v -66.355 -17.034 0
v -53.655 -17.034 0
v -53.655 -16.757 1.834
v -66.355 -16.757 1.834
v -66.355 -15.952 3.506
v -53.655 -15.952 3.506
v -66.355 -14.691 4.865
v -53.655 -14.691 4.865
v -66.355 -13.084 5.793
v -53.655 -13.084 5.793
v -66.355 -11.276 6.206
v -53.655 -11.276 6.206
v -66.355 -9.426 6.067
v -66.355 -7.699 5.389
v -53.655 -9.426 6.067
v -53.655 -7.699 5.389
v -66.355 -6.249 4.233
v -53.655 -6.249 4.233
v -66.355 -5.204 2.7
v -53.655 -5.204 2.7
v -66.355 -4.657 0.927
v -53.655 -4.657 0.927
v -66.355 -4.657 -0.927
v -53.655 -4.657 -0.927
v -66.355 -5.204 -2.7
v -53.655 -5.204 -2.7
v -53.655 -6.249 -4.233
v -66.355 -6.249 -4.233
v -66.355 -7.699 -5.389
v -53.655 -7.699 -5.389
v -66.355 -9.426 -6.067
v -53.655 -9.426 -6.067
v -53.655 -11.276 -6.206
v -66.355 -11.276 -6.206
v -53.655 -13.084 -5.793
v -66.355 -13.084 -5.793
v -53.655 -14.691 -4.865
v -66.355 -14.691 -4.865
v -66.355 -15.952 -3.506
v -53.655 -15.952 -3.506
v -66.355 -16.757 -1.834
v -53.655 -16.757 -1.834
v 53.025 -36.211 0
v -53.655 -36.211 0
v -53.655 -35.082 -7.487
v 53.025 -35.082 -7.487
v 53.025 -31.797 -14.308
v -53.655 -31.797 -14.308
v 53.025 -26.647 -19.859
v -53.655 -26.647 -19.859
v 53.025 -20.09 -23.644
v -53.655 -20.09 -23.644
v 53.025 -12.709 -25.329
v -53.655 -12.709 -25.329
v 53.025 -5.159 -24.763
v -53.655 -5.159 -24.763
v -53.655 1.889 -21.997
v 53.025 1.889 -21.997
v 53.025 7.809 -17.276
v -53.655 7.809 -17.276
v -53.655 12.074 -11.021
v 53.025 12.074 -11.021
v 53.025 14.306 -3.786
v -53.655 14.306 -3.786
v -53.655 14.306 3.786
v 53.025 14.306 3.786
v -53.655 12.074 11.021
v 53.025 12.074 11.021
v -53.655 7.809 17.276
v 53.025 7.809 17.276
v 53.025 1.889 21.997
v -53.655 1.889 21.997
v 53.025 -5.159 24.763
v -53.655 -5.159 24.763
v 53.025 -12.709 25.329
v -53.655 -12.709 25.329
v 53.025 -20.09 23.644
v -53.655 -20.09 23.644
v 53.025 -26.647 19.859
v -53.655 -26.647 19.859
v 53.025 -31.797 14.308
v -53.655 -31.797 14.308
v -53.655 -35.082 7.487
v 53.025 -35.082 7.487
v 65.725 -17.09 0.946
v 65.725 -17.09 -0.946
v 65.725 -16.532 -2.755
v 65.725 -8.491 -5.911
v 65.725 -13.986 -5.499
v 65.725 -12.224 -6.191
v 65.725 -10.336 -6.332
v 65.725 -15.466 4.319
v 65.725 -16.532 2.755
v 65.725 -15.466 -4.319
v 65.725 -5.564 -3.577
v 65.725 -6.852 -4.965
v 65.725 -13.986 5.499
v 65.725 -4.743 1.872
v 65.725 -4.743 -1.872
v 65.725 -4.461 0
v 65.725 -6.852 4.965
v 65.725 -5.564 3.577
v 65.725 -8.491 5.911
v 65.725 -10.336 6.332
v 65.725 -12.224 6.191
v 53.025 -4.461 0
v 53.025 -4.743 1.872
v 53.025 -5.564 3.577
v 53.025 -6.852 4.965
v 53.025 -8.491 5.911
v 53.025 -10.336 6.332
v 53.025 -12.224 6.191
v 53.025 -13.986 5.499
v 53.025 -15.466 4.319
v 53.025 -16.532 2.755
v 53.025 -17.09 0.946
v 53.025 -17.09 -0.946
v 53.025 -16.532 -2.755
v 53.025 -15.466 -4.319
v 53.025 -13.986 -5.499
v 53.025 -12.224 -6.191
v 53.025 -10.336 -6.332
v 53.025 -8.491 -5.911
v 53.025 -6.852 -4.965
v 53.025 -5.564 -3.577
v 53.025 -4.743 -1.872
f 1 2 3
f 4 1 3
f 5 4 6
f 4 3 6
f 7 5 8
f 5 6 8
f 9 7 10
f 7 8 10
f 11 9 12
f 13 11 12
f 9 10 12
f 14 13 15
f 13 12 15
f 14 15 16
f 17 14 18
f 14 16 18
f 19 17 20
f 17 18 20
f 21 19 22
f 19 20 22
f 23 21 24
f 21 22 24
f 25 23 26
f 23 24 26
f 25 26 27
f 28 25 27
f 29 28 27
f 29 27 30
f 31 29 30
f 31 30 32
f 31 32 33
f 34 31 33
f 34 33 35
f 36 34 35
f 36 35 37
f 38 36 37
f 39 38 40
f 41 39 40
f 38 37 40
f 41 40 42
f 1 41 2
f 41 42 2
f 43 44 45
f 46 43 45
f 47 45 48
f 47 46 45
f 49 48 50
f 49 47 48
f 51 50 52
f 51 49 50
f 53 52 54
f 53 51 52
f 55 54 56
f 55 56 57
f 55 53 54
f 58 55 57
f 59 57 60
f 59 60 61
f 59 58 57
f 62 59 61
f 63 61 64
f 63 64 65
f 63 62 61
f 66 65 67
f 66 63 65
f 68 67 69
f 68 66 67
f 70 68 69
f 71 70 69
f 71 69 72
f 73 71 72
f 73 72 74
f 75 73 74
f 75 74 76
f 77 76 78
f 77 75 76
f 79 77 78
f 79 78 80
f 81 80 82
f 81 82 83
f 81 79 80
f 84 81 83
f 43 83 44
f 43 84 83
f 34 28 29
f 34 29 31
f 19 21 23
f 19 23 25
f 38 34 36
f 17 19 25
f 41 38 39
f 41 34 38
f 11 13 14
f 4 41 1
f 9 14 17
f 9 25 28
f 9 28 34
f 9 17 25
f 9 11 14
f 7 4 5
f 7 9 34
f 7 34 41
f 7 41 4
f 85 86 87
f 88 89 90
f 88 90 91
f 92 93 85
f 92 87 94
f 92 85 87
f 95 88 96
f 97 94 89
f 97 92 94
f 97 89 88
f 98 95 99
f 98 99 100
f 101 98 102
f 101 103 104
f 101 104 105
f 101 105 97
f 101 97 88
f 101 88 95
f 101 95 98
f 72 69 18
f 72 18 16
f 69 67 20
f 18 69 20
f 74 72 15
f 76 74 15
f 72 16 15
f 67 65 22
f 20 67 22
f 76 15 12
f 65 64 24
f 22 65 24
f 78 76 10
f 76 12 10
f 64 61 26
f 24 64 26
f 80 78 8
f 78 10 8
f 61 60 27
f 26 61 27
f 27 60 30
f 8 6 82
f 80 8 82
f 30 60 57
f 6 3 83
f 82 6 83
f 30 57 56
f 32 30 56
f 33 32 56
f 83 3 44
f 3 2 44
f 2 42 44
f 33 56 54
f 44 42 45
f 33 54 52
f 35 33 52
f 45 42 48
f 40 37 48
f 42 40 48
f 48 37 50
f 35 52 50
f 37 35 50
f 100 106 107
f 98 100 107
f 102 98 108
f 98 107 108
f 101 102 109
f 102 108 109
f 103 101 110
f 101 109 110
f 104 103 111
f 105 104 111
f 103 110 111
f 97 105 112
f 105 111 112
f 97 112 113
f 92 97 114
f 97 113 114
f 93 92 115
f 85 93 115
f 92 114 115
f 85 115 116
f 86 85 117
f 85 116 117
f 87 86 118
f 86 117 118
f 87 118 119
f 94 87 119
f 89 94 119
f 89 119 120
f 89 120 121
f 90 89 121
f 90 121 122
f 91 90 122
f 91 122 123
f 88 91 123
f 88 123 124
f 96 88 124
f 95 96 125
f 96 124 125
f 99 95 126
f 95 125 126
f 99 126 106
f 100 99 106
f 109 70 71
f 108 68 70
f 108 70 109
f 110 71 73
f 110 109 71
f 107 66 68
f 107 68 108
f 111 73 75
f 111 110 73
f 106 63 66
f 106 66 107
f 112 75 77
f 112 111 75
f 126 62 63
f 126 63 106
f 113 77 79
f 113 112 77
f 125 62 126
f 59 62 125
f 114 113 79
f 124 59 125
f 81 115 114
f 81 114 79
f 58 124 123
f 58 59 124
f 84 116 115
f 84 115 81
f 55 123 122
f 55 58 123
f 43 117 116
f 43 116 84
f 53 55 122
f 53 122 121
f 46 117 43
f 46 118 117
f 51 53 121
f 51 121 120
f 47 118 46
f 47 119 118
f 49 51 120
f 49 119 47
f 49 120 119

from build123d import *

# Parameters (mm, degrees)
F0_W     = 106.68
F0_H     = 25.4
F2_R     = 6.223
F3_DEPTH = 12.7
F4_R     = 6.35
F5_DEPTH = 12.7


with BuildPart() as f1:
    # F0 (on Top) → F1 (revolve)
    with BuildSketch(Plane.XY):
        with Locations((-0.314683, -23.51072)):
            Rectangle(F0_W, F0_H)
    revolve(axis=Axis((-0.314683, -10.81072, 0), (1, 0, 0)))

    # F2 (on face) → F3 (join)
    with BuildSketch(Plane(origin=(-53.654683, 0, 0), x_dir=(0, -1, 0), z_dir=(-1, 0, 0))):
        with Locations((10.81072, 0)):
            Circle(F2_R)
    extrude(amount=F3_DEPTH)

    # F4 (on face) → F5 (join)
    with BuildSketch(Plane.YZ.offset(53.025317)):
        with Locations((-10.81072, 0)):
            Circle(F4_R)
    extrude(amount=F5_DEPTH)


solid = f1.part
